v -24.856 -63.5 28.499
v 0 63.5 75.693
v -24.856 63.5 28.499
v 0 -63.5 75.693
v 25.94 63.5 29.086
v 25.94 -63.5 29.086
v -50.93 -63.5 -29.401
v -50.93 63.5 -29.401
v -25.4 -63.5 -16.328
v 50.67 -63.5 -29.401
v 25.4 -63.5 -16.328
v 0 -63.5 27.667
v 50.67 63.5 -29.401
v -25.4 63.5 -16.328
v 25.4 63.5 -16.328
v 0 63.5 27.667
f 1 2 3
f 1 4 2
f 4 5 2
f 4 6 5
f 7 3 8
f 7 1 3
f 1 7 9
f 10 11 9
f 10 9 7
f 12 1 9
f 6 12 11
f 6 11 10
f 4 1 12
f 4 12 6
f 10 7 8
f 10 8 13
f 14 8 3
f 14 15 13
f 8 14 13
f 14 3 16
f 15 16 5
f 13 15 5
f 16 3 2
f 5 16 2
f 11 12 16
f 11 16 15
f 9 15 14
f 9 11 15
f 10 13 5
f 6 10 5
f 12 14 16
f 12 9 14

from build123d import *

# Parameters (mm, degrees)
F1_DEPTH = 63.5


with BuildPart() as f1:
    # F0 (on Front) → F1 (new body, symmetric)
    with BuildSketch(Plane.XZ):
        Polygon((-24.8563379985, 28.4985704217), (-50.9303996729, -29.4012854313), (50.6696003271, -29.4012854313), (25.9402706639, 29.0855528694), (0, 75.6930410862), align=None)
        Polygon((0, 27.6665240526), (25.4, -16.3275664596), (-25.4, -16.3275664596), align=None, mode=Mode.SUBTRACT)
    extrude(amount=F1_DEPTH, both=True)


solid = f1.part
